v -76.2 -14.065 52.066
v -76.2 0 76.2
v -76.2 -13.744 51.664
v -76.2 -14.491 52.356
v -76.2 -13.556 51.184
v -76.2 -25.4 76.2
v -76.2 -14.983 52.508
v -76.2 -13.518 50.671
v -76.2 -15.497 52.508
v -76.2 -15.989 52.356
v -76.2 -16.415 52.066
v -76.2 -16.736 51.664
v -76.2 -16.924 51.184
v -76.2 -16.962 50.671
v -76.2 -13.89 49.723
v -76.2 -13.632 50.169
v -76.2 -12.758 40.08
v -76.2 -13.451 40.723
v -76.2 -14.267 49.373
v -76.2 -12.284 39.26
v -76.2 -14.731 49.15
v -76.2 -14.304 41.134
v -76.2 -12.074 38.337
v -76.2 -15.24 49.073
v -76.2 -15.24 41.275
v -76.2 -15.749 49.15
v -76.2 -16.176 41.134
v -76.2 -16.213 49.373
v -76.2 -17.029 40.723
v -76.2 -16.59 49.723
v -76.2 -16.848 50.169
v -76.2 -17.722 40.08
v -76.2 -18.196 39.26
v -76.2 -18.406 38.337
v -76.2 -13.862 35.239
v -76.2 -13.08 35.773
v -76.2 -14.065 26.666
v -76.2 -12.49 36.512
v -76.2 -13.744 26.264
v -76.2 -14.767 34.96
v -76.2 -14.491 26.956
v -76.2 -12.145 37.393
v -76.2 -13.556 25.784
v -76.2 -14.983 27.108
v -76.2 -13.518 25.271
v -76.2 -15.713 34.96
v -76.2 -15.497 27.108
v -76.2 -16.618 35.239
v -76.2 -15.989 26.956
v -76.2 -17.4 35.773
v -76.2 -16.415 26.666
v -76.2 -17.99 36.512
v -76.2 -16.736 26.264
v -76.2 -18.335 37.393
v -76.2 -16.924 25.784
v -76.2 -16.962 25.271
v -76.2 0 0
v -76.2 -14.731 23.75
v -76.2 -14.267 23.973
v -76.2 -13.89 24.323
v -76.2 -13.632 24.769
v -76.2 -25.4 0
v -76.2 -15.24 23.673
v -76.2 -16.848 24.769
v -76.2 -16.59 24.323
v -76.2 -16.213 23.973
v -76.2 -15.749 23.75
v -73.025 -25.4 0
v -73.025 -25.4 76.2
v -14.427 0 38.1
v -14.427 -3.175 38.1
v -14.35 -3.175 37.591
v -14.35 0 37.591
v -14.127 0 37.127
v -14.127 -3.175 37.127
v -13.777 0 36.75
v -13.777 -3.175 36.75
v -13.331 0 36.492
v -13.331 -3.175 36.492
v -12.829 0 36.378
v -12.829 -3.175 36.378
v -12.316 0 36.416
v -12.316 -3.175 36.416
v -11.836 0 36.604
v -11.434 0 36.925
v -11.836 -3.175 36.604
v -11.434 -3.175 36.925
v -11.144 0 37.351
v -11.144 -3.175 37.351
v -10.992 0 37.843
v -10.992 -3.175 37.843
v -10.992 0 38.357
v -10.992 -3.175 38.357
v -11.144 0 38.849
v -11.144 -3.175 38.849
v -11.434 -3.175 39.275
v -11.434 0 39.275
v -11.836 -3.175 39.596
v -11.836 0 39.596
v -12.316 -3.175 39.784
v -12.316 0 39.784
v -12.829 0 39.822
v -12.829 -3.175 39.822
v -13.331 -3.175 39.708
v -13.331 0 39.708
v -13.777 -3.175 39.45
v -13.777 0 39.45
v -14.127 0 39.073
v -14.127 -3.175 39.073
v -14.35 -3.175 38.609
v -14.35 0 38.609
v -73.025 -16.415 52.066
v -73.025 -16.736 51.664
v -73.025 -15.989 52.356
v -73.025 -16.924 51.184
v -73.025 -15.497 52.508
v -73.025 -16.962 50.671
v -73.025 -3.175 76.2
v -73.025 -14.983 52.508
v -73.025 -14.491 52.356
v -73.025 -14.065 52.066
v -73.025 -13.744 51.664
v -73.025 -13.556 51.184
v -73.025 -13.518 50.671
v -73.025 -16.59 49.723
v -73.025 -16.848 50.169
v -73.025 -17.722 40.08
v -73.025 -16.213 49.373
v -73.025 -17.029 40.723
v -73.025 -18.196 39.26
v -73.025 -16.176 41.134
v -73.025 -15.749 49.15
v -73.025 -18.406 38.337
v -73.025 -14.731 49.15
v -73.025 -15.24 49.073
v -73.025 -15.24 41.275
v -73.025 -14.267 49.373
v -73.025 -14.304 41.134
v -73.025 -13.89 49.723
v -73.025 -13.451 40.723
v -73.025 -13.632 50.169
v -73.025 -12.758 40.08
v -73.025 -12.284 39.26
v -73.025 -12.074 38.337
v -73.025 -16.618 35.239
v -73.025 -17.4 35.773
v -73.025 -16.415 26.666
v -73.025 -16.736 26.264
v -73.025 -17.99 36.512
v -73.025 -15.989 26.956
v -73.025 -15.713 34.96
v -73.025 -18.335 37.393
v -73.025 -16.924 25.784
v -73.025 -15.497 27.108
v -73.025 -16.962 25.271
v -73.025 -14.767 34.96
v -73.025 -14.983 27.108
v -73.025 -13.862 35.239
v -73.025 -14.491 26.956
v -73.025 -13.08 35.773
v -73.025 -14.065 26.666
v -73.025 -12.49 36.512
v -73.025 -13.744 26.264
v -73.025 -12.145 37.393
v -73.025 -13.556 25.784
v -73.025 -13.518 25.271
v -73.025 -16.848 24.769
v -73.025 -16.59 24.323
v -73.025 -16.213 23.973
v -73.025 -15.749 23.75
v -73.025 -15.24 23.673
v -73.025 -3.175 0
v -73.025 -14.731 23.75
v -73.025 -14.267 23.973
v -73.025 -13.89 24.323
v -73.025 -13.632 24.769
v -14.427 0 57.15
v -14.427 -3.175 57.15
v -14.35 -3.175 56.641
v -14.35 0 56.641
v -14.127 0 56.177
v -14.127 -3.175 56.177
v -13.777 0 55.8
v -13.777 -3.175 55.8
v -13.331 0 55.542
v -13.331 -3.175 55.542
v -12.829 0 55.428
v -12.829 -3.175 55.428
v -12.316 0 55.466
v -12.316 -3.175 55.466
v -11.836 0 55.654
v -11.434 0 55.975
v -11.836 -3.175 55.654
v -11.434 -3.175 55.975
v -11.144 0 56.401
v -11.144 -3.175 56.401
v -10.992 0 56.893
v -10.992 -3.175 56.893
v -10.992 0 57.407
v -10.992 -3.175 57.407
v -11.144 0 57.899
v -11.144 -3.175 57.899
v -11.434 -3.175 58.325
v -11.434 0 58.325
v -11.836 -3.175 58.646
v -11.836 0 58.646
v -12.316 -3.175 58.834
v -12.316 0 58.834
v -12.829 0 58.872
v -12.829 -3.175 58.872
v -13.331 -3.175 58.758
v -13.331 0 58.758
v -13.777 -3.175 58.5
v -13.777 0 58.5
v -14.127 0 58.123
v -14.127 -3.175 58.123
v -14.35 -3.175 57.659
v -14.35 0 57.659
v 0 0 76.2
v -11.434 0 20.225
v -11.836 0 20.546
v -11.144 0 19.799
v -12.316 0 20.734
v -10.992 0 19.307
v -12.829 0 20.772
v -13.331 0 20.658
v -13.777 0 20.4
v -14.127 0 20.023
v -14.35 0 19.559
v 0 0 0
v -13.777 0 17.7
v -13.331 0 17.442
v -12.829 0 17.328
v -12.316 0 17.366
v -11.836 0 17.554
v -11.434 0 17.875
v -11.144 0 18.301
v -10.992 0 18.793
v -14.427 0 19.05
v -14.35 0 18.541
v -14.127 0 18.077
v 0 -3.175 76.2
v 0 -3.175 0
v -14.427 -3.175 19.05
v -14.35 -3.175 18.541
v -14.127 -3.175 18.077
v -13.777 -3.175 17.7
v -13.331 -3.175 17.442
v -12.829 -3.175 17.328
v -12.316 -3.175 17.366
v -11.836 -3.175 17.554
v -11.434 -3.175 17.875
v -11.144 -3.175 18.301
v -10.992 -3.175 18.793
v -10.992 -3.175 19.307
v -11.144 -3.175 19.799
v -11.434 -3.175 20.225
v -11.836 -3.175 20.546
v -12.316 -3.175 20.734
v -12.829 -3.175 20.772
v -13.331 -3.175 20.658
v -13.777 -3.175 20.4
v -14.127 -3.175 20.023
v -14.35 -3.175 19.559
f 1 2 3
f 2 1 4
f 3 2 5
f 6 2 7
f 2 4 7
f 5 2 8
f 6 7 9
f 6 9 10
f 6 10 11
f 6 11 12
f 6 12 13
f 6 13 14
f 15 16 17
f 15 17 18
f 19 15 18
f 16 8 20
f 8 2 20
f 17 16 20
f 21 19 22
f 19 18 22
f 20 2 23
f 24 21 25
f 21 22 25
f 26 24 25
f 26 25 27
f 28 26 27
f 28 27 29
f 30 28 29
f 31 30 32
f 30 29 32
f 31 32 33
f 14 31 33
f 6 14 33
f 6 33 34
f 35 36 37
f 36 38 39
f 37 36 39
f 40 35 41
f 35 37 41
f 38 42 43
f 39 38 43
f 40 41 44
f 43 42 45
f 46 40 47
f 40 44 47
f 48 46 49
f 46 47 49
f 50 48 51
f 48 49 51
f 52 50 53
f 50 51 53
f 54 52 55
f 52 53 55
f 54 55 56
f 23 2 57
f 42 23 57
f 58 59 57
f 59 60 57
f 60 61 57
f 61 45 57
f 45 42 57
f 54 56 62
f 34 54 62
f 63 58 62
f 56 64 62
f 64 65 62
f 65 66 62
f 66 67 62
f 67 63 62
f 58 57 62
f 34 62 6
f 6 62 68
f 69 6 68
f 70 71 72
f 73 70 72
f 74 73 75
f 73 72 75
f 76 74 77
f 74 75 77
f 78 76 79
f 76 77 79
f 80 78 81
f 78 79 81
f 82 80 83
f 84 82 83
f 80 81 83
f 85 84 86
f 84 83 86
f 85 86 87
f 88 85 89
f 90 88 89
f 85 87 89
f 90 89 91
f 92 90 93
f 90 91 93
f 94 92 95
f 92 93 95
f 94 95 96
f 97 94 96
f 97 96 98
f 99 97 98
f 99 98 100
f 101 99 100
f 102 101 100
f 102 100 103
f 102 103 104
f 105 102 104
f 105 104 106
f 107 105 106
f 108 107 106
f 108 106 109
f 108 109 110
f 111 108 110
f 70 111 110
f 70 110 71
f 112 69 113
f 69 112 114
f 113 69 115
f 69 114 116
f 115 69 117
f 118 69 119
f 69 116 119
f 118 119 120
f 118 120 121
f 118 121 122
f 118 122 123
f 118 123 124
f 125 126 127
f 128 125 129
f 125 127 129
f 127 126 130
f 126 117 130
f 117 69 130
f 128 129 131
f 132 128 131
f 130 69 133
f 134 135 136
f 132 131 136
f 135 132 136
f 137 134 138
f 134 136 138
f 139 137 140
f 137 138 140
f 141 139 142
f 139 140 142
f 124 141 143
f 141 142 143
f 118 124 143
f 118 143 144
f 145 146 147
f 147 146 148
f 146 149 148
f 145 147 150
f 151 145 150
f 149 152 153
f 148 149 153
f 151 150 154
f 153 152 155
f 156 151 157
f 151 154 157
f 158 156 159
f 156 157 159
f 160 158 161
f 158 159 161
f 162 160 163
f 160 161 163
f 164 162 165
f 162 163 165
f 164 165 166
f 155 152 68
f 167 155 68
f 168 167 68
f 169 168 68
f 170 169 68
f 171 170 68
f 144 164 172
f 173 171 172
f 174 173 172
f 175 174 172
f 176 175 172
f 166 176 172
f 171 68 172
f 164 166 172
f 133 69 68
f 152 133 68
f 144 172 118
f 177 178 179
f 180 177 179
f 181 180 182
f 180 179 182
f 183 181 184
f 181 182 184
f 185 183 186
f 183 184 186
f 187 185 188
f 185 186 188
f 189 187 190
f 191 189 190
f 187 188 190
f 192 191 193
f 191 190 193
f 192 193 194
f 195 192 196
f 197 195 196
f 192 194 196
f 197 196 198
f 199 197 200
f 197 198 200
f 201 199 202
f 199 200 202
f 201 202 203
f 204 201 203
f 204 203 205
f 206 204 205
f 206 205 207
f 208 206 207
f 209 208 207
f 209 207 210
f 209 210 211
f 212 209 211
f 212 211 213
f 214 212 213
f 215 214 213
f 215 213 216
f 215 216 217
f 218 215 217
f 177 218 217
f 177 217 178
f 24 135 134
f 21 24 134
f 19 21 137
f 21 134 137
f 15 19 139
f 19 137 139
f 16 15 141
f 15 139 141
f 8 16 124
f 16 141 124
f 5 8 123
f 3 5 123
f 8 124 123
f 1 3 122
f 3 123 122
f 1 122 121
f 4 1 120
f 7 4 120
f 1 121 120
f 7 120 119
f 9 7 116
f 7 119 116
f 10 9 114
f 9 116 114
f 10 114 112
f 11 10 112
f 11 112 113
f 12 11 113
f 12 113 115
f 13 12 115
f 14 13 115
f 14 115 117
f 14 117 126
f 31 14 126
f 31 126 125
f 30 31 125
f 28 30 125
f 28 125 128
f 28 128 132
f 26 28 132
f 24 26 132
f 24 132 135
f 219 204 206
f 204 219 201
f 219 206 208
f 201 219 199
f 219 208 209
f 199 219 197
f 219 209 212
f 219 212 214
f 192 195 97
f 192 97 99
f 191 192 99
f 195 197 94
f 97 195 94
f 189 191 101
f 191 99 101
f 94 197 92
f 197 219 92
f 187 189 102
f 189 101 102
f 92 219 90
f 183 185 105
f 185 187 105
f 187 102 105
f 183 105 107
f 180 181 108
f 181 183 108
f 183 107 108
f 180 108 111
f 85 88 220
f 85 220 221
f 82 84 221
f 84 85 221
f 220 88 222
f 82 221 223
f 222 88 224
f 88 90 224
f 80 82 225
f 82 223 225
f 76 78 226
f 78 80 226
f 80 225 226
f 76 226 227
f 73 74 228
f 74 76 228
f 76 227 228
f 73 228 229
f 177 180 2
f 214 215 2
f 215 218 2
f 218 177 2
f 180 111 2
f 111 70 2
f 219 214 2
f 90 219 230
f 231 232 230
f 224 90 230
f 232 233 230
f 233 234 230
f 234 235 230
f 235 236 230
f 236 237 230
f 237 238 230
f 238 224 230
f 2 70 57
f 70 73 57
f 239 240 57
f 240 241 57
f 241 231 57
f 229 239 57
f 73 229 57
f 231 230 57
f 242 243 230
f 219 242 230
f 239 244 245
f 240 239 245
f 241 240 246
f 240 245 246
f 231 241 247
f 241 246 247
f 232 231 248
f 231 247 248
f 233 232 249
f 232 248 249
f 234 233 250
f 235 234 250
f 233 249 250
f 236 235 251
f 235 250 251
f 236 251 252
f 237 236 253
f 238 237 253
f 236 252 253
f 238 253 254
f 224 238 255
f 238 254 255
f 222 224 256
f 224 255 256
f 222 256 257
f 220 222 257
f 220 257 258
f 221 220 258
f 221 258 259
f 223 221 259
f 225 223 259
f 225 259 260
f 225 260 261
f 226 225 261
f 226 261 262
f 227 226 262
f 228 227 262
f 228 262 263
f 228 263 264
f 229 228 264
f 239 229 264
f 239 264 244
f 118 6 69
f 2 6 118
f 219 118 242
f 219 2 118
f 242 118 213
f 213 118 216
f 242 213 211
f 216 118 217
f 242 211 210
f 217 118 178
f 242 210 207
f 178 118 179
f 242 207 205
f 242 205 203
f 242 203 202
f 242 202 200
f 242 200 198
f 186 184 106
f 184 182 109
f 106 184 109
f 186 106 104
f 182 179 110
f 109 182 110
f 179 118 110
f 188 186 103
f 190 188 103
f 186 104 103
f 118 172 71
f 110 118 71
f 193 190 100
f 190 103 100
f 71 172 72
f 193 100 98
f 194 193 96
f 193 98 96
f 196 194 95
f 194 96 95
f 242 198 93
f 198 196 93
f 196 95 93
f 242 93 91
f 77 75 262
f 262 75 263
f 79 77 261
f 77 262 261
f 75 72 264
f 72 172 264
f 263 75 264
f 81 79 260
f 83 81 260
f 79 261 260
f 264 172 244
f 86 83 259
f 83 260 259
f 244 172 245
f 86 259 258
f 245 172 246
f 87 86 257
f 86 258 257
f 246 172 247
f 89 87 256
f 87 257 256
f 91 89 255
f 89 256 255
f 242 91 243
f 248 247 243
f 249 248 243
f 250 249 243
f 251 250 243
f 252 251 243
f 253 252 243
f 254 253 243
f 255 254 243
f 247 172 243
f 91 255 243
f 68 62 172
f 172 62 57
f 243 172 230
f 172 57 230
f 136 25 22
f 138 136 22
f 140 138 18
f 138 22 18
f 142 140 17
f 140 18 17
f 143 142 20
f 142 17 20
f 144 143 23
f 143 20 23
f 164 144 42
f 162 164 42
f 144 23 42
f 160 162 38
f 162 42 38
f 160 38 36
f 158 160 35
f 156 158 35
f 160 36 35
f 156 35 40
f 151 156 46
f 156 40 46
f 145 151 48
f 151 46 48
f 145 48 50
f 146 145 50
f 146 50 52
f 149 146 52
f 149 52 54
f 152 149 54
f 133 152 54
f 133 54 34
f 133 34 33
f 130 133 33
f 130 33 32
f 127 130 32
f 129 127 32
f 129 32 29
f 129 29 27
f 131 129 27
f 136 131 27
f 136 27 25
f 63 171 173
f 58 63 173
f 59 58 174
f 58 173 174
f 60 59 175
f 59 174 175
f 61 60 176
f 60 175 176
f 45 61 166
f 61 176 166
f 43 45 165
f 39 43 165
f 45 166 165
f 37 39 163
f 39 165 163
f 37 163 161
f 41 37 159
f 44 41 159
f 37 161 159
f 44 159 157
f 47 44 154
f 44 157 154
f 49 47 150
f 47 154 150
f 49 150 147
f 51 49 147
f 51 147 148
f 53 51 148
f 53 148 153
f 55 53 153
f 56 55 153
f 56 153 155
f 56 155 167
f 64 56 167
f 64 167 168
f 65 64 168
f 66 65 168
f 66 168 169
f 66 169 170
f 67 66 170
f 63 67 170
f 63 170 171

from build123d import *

# Parameters (mm, degrees)
BOSS_EXTRUDE1_DEPTH       = 76.2
CUT_EXTRUDE1_REACH        = 112.716
SKETCH8_R                 = 3.175
TAP_DRILL_FOR_8_32_TAP1_D = 3.4544
TAP_DRILL_FOR_8_32_TAP2_D = 3.4544


with BuildPart() as part:
    # Sketch2 → Boss-Extrude1 (new body)
    with BuildSketch(Plane.XY):
        Polygon((0, 0), (-76.2, 0), (-76.2, -25.4), (-73.025, -25.4), (-73.025, -3.175), (0, -3.175), align=None)
    extrude(amount=BOSS_EXTRUDE1_DEPTH)

    # Sketch8 → Cut-Extrude1 (cut, up to next)
    with BuildSketch(Plane.ZY.offset(76.2), mode=Mode.PRIVATE) as cut_extrude1_sk1:
        with Locations((38.1, -15.24)):
            Circle(SKETCH8_R)
    cut_extrude1_tool1 = extrude(cut_extrude1_sk1.sketch, amount=-CUT_EXTRUDE1_REACH, mode=Mode.PRIVATE) & part.part
    add(cut_extrude1_tool1.solids().sort_by_distance((-76.2, -15.24, 38.1))[0], mode=Mode.SUBTRACT)

    # Tap Drill for #8-32 Tap1 (through all)
    with Locations(Plane(origin=(0, 0, 0), x_dir=(1, 0, 0), z_dir=(0, 1, 0))):
        with Locations((-12.7, -38.1), (-12.7, -19.05), (-12.7, -57.15)):
            Hole(TAP_DRILL_FOR_8_32_TAP1_D / 2)

    # Tap Drill for #8-32 Tap2 (through all)
    with Locations(Plane.ZY.offset(76.2)):
        with Locations((25.4, -15.24), (50.8, -15.24)):
            Hole(TAP_DRILL_FOR_8_32_TAP2_D / 2)


solid = part.part
